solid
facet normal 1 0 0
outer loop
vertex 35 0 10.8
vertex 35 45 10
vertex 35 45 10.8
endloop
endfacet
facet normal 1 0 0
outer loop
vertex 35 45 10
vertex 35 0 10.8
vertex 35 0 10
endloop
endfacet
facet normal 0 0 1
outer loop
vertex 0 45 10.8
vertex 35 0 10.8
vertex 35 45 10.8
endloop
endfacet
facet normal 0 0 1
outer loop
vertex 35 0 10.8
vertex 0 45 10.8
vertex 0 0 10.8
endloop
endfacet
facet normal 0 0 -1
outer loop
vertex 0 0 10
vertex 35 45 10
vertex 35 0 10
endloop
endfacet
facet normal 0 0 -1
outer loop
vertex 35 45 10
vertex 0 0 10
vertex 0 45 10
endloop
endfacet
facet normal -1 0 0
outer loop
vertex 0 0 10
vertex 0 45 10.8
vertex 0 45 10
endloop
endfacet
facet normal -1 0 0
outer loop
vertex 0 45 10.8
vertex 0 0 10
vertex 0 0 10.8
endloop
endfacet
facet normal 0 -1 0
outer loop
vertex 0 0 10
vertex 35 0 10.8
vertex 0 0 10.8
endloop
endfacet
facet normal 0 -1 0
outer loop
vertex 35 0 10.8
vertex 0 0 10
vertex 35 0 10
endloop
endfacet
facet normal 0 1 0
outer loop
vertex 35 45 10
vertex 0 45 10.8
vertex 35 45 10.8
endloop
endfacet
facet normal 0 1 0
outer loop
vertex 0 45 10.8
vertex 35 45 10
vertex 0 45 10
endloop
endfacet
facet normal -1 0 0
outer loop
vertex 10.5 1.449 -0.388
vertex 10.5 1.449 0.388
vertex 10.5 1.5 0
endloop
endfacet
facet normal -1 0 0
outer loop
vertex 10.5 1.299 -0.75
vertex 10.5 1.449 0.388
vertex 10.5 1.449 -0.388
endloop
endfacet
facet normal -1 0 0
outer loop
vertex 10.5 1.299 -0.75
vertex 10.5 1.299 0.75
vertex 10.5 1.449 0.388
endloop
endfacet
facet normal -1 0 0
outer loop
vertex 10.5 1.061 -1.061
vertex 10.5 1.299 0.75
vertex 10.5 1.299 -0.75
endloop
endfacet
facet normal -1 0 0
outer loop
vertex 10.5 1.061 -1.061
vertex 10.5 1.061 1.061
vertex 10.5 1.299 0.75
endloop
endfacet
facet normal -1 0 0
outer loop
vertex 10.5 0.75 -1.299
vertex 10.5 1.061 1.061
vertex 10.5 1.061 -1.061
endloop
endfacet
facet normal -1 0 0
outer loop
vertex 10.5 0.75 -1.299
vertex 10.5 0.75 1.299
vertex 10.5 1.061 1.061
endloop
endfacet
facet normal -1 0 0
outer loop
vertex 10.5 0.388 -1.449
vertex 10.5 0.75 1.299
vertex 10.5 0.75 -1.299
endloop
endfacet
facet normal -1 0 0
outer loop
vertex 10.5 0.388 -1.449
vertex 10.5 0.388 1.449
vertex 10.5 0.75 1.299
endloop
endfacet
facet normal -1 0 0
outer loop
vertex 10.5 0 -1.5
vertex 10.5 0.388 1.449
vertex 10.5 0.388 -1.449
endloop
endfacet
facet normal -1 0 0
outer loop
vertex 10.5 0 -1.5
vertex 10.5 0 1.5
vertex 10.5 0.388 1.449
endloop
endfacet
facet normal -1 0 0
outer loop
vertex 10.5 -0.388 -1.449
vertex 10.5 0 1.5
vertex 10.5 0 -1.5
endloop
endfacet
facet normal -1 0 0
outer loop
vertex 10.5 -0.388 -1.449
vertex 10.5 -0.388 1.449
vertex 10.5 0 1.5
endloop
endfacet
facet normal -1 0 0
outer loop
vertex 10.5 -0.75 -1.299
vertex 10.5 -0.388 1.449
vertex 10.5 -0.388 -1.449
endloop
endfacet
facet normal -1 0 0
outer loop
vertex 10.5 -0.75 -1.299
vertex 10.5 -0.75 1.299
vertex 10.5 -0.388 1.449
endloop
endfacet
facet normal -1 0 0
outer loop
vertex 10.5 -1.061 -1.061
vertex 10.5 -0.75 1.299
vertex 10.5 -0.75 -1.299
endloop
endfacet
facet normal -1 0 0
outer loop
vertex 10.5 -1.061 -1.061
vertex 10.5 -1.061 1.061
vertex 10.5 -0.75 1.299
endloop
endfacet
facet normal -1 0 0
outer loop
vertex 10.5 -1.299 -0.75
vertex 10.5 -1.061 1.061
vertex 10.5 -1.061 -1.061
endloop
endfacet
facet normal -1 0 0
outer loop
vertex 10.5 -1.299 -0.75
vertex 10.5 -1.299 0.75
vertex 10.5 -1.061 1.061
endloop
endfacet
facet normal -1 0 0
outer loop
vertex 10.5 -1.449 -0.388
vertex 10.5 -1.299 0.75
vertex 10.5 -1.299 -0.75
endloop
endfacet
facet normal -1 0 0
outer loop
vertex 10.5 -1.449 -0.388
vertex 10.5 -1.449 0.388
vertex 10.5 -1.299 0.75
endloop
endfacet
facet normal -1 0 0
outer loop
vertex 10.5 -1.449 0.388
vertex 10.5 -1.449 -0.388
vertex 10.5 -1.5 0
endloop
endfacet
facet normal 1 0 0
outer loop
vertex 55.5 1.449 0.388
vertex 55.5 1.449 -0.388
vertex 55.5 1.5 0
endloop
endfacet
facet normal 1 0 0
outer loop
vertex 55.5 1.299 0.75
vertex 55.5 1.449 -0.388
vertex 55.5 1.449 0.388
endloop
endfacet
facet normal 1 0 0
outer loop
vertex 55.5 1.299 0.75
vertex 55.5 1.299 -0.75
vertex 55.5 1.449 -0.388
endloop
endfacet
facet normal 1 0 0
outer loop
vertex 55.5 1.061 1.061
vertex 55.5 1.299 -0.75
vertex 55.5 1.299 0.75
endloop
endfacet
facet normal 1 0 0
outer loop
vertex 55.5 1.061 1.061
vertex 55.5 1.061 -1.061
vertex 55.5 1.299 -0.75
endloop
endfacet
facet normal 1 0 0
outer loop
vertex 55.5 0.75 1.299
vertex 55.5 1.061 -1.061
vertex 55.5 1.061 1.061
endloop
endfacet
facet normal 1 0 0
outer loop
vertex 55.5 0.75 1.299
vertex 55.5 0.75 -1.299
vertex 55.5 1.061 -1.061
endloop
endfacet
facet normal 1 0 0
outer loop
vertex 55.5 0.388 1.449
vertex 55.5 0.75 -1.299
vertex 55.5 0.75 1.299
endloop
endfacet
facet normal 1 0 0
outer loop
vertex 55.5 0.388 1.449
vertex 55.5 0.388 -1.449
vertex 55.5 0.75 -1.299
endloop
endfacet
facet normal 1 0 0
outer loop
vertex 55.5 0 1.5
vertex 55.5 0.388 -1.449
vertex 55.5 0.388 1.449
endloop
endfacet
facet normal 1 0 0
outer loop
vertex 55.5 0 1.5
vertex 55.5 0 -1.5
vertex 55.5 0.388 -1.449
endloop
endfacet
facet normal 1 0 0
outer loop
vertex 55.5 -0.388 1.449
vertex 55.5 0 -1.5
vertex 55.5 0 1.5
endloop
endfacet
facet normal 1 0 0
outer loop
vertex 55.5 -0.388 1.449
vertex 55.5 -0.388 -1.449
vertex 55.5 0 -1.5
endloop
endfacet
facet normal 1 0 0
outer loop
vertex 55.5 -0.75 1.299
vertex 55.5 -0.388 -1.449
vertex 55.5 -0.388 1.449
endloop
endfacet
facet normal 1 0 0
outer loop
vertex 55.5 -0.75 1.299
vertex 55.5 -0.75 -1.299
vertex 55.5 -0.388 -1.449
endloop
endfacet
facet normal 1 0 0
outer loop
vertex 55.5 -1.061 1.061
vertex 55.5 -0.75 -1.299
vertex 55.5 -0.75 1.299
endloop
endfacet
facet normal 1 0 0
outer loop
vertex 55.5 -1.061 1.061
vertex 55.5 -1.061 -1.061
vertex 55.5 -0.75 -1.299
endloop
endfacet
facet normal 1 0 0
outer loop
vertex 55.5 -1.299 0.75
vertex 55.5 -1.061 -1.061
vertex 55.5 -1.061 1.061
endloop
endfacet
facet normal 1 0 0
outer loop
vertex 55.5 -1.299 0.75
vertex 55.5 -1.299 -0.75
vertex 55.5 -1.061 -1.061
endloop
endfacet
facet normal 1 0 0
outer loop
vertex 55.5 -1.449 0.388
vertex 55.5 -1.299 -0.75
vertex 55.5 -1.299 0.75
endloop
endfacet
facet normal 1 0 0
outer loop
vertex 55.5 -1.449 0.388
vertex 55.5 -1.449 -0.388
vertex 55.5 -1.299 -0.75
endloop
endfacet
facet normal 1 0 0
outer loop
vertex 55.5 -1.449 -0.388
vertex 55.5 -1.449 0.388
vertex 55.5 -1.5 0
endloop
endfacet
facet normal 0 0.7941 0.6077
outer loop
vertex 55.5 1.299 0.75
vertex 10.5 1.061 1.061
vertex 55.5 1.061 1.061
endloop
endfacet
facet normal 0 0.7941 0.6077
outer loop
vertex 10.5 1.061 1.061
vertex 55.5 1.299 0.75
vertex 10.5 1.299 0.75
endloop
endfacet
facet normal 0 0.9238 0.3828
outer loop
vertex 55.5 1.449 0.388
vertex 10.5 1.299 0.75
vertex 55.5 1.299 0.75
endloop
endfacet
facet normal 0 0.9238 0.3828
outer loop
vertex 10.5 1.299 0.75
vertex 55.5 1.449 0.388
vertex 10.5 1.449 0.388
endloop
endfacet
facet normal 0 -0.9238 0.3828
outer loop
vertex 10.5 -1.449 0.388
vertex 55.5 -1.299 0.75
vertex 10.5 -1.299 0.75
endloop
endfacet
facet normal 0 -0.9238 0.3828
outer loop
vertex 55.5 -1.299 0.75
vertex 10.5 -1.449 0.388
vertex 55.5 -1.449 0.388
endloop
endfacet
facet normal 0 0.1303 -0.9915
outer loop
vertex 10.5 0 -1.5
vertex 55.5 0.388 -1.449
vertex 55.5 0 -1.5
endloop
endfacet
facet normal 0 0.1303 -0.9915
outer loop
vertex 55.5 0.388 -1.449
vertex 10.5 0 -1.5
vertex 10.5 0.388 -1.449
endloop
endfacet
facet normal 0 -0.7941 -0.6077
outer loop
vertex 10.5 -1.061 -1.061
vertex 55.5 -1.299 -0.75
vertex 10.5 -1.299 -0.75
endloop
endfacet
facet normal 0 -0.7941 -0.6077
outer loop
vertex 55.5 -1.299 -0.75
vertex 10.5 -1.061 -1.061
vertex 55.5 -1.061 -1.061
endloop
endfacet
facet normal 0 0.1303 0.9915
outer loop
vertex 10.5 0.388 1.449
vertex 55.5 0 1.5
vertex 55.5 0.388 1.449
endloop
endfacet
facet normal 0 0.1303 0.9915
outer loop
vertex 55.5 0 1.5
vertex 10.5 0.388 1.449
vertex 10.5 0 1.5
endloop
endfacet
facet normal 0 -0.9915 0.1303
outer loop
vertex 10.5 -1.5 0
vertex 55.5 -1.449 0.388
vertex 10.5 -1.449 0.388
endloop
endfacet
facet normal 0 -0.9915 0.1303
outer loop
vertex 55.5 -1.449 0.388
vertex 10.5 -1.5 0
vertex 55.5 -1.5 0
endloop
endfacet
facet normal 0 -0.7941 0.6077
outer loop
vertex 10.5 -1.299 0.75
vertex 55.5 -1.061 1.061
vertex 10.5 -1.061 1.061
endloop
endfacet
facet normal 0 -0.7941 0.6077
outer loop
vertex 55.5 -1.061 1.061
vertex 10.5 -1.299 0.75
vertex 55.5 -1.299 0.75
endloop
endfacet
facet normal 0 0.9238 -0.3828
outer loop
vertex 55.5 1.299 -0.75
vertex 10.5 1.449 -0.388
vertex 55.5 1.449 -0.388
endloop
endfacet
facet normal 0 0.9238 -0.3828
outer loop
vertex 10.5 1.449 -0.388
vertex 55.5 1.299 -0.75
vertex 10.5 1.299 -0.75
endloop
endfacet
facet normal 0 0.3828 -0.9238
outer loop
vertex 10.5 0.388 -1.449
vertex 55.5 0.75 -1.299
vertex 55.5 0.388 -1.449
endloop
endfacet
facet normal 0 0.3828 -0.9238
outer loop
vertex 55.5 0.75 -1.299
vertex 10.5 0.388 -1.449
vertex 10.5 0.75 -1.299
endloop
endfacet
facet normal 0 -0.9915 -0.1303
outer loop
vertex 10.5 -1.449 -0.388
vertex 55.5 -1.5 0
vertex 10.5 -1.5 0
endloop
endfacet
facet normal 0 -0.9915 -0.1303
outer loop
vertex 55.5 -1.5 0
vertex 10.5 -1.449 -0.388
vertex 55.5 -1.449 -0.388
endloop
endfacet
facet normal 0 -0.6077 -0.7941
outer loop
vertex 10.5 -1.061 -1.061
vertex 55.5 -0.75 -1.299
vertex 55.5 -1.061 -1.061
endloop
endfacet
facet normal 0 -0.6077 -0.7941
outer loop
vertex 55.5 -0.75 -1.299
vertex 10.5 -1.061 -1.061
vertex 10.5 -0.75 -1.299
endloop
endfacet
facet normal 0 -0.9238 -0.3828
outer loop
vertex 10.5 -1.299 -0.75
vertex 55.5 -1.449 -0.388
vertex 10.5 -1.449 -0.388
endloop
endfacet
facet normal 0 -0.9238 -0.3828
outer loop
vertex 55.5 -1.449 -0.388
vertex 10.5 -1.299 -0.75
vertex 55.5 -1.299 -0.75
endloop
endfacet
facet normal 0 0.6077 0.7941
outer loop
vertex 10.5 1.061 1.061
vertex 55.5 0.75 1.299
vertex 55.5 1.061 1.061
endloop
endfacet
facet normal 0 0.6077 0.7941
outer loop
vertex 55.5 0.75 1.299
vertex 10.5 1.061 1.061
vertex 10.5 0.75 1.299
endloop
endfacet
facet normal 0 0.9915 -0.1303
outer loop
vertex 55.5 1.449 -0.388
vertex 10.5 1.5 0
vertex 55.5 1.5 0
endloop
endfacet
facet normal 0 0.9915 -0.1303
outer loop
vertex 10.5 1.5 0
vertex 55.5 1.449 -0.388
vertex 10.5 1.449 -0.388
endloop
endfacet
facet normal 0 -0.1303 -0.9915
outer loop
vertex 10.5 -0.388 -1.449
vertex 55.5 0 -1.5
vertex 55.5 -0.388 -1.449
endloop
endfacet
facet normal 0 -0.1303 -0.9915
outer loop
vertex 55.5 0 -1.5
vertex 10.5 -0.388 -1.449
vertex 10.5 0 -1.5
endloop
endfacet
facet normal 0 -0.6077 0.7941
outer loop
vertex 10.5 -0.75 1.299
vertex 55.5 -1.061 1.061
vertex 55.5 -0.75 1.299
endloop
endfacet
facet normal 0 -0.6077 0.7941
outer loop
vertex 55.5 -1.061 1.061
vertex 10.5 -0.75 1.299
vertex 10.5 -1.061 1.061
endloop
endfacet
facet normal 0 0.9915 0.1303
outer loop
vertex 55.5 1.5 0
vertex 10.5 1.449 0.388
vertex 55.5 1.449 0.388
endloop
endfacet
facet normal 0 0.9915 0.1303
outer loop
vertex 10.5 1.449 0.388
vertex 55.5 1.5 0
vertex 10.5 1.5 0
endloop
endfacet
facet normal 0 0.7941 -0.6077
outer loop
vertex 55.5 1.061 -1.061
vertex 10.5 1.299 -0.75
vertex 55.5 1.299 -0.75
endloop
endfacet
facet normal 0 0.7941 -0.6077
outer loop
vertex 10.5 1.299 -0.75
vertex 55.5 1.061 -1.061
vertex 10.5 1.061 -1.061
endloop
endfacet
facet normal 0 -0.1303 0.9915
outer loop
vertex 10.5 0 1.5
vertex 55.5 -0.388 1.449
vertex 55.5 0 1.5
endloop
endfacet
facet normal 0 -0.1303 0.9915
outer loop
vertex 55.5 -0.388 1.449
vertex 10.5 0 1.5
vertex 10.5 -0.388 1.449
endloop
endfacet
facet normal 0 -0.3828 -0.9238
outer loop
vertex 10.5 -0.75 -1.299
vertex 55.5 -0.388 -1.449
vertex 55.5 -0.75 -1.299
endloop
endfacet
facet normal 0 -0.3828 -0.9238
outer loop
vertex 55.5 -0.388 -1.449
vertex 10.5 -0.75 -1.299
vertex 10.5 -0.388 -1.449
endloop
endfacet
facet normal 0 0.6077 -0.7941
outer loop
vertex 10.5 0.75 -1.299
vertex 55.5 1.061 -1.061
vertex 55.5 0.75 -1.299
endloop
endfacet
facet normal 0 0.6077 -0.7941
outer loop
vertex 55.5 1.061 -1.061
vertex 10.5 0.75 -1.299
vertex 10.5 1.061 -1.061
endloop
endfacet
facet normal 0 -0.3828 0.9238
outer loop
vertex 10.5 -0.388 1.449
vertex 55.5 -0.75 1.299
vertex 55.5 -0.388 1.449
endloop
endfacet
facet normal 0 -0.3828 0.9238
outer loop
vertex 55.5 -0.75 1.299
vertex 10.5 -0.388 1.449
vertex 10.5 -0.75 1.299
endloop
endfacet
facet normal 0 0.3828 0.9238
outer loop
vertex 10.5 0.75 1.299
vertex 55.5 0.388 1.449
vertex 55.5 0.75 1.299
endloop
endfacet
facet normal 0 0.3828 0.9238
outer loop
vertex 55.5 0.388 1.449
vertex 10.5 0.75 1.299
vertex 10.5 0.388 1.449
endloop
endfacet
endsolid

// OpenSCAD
// Music Box — parametric comb + cylinder ENVELOPE master.
// SPDX-License-Identifier: CC-BY-4.0
//
// Authority: pending_measurement. NOT fabrication authority. L2 V5
// build-packet candidate — decision-record.md explicitly rejects CAD/DXF
// release at this stage; this file is a pending_measurement scaffold only
// (register row "future-cad" in visual-output-register.csv anticipates it).
//
// Dimension sources (do not edit values without updating the source record):
//   - tooth length/width/thickness, steel E/rho, cantilever beta, tooth lane
//     count, event rows per revolution, cylinder angular speed: ALL taken
//     verbatim from wolfram/music-box-wolfram-model.wl's *Estimate constants,
//     each explicitly labeled there "estimate — pending measurement, not
//     fabrication authority". No new numeric values are introduced here.
//   - cantilever tooth-frequency formula: wolfram/music-box-wolfram-model.wl
//     cantileverToothFrequency[] (standard clamped-free beam formula,
//     beta_1 = 1.875 is the textbook first-mode eigenvalue, not invented).
//
// Scope boundary: this master models the COMB (18 identical representative
// teeth — tooth-to-tooth TUNING is explicitly out of scope per design.md
// "Tooth tuning is intentionally not specified here") and a CYLINDER
// ENVELOPE. The cylinder's LENGTH is derived from the tooth-lane count and
// tooth width (a mechanical constraint: the barrel must span the comb's
// lanes) — this is a derived relationship, not a new invented dimension.
// The cylinder's DIAMETER has NO estimate anywhere in this repo (bom.csv /
// cut-list.csv / decision-record.md all mark cylinder dimensions
// `no_released_dimensions` / "cylinder dimensions" as explicitly avoided) —
// it is drawn as a thin schematic axis rod only, NOT a claimed barrel
// diameter. Pin grid/coordinates, governor, escapement, drive train, and
// case/resonance geometry are entirely out of scope (design.md "Parametric
// Intent").
//
// Units: millimeters.

/* [Comb tooth — wolfram/music-box-wolfram-model.wl *Estimate constants] */
tooth_length_mm    = 35;     // toothLengthEstimate = 0.035 m
tooth_width_mm      = 2.5;    // toothWidthEstimate = 0.0025 m
tooth_thickness_mm  = 0.8;    // toothThicknessEstimate = 0.0008 m
tooth_lane_count    = 18;     // toothLaneCountEstimate — uniform, tuning out of scope

/* [Material reference — wolfram model, first-order model only] */
steel_density_kg_m3     = 7850;    // steelDensityEstimate
steel_youngs_modulus_pa = 200e9;   // steelYoungModulusEstimate
first_mode_beta         = 1.875;   // firstModeBetaEstimate (cantilever beam, textbook constant)

/* [Cylinder — timing/program envelope only] */
event_rows_per_revolution = 32;    // eventRowsPerRevolutionEstimate
cylinder_angular_speed_rad_s = 6.0; // cylinderAngularSpeedEstimate

// ---------------------------------------------------------------------------
// Derived geometry (formulas, not baked values)
// ---------------------------------------------------------------------------

// Cantilever tooth fundamental frequency (mirrors cantileverToothFrequency[]):
//   f = (beta^2 / (2*pi*L^2)) * sqrt(E*I / (rho*A)),  I = w*t^3/12,  A = w*t
function tooth_second_moment_m4(w_m, t_m) = w_m * pow(t_m, 3) / 12;
function tooth_area_m2(w_m, t_m) = w_m * t_m;

function cantilever_tooth_freq_hz(l_m, w_m, t_m, e_pa, rho, beta) =
  (pow(beta, 2) / (2 * PI * pow(l_m, 2))) *
  sqrt((e_pa * tooth_second_moment_m4(w_m, t_m)) / (rho * tooth_area_m2(w_m, t_m)));

// Cylinder event rate (mirrors eventRate[]): rows/rev * (angular speed / 2pi)
function cylinder_event_rate_hz(omega_rad_s, rows_per_rev) =
  rows_per_rev * (omega_rad_s / (2 * PI));

// Cylinder envelope LENGTH: minimum span to address every comb lane, packed
// edge-to-edge (no service clearance modeled — envelope only).
cylinder_length_mm = tooth_lane_count * tooth_width_mm;

// Cylinder envelope "diameter": NOT a dimension claim. No cylinder diameter
// estimate exists anywhere in this repo. Drawn as a thin reference rod only.
cylinder_axis_rod_dia_mm = 3;

// ---------------------------------------------------------------------------
// Modules
// ---------------------------------------------------------------------------

module comb_tooth(length_mm, width_mm, thickness_mm) {
  color("Silver")
    cube([length_mm, width_mm, thickness_mm]);
}

module steel_comb(lane_count, length_mm, width_mm, thickness_mm) {
  // Uniform representative teeth — tooth-to-tooth tuning is out of scope.
  for (i = [0 : lane_count - 1])
    translate([0, i * width_mm, 0])
      comb_tooth(length_mm, width_mm, thickness_mm);
}

module cylinder_axis_rod(length_mm, dia_mm) {
  // Schematic axis marker only — NOT a claimed barrel diameter (see header).
  color("Gray", 0.5)
    rotate([0, 90, 0])
      cylinder(h = length_mm, d = dia_mm, $fn = 24);
}

module music_box_envelope() {
  comb_length = tooth_length_mm;
  comb_span = tooth_lane_count * tooth_width_mm;
  // Comb sits above the cylinder axis, mount root at x=0.
  translate([0, 0, 10])
    steel_comb(tooth_lane_count, tooth_length_mm, tooth_width_mm, tooth_thickness_mm);
  // Cylinder axis runs the length of the comb's lane span, offset below.
  translate([comb_length * 0.3, 0, 0])
    cylinder_axis_rod(cylinder_length_mm, cylinder_axis_rod_dia_mm);
}

music_box_envelope();

// Echo derived values so `openscad` doubles as a cross-check against
// wolfram/music-box-wolfram-model.wl.
echo(str("tooth_freq_hz=",
  cantilever_tooth_freq_hz(tooth_length_mm / 1000, tooth_width_mm / 1000,
    tooth_thickness_mm / 1000, steel_youngs_modulus_pa, steel_density_kg_m3, first_mode_beta)));
echo(str("cylinder_event_rate_hz=",
  cylinder_event_rate_hz(cylinder_angular_speed_rad_s, event_rows_per_revolution)));
echo(str("cylinder_length_mm (derived, tooth_lane_count * tooth_width_mm)=", cylinder_length_mm));
echo("cylinder_axis_rod_dia_mm is a schematic placeholder ONLY — no diameter estimate exists in this repo.");
